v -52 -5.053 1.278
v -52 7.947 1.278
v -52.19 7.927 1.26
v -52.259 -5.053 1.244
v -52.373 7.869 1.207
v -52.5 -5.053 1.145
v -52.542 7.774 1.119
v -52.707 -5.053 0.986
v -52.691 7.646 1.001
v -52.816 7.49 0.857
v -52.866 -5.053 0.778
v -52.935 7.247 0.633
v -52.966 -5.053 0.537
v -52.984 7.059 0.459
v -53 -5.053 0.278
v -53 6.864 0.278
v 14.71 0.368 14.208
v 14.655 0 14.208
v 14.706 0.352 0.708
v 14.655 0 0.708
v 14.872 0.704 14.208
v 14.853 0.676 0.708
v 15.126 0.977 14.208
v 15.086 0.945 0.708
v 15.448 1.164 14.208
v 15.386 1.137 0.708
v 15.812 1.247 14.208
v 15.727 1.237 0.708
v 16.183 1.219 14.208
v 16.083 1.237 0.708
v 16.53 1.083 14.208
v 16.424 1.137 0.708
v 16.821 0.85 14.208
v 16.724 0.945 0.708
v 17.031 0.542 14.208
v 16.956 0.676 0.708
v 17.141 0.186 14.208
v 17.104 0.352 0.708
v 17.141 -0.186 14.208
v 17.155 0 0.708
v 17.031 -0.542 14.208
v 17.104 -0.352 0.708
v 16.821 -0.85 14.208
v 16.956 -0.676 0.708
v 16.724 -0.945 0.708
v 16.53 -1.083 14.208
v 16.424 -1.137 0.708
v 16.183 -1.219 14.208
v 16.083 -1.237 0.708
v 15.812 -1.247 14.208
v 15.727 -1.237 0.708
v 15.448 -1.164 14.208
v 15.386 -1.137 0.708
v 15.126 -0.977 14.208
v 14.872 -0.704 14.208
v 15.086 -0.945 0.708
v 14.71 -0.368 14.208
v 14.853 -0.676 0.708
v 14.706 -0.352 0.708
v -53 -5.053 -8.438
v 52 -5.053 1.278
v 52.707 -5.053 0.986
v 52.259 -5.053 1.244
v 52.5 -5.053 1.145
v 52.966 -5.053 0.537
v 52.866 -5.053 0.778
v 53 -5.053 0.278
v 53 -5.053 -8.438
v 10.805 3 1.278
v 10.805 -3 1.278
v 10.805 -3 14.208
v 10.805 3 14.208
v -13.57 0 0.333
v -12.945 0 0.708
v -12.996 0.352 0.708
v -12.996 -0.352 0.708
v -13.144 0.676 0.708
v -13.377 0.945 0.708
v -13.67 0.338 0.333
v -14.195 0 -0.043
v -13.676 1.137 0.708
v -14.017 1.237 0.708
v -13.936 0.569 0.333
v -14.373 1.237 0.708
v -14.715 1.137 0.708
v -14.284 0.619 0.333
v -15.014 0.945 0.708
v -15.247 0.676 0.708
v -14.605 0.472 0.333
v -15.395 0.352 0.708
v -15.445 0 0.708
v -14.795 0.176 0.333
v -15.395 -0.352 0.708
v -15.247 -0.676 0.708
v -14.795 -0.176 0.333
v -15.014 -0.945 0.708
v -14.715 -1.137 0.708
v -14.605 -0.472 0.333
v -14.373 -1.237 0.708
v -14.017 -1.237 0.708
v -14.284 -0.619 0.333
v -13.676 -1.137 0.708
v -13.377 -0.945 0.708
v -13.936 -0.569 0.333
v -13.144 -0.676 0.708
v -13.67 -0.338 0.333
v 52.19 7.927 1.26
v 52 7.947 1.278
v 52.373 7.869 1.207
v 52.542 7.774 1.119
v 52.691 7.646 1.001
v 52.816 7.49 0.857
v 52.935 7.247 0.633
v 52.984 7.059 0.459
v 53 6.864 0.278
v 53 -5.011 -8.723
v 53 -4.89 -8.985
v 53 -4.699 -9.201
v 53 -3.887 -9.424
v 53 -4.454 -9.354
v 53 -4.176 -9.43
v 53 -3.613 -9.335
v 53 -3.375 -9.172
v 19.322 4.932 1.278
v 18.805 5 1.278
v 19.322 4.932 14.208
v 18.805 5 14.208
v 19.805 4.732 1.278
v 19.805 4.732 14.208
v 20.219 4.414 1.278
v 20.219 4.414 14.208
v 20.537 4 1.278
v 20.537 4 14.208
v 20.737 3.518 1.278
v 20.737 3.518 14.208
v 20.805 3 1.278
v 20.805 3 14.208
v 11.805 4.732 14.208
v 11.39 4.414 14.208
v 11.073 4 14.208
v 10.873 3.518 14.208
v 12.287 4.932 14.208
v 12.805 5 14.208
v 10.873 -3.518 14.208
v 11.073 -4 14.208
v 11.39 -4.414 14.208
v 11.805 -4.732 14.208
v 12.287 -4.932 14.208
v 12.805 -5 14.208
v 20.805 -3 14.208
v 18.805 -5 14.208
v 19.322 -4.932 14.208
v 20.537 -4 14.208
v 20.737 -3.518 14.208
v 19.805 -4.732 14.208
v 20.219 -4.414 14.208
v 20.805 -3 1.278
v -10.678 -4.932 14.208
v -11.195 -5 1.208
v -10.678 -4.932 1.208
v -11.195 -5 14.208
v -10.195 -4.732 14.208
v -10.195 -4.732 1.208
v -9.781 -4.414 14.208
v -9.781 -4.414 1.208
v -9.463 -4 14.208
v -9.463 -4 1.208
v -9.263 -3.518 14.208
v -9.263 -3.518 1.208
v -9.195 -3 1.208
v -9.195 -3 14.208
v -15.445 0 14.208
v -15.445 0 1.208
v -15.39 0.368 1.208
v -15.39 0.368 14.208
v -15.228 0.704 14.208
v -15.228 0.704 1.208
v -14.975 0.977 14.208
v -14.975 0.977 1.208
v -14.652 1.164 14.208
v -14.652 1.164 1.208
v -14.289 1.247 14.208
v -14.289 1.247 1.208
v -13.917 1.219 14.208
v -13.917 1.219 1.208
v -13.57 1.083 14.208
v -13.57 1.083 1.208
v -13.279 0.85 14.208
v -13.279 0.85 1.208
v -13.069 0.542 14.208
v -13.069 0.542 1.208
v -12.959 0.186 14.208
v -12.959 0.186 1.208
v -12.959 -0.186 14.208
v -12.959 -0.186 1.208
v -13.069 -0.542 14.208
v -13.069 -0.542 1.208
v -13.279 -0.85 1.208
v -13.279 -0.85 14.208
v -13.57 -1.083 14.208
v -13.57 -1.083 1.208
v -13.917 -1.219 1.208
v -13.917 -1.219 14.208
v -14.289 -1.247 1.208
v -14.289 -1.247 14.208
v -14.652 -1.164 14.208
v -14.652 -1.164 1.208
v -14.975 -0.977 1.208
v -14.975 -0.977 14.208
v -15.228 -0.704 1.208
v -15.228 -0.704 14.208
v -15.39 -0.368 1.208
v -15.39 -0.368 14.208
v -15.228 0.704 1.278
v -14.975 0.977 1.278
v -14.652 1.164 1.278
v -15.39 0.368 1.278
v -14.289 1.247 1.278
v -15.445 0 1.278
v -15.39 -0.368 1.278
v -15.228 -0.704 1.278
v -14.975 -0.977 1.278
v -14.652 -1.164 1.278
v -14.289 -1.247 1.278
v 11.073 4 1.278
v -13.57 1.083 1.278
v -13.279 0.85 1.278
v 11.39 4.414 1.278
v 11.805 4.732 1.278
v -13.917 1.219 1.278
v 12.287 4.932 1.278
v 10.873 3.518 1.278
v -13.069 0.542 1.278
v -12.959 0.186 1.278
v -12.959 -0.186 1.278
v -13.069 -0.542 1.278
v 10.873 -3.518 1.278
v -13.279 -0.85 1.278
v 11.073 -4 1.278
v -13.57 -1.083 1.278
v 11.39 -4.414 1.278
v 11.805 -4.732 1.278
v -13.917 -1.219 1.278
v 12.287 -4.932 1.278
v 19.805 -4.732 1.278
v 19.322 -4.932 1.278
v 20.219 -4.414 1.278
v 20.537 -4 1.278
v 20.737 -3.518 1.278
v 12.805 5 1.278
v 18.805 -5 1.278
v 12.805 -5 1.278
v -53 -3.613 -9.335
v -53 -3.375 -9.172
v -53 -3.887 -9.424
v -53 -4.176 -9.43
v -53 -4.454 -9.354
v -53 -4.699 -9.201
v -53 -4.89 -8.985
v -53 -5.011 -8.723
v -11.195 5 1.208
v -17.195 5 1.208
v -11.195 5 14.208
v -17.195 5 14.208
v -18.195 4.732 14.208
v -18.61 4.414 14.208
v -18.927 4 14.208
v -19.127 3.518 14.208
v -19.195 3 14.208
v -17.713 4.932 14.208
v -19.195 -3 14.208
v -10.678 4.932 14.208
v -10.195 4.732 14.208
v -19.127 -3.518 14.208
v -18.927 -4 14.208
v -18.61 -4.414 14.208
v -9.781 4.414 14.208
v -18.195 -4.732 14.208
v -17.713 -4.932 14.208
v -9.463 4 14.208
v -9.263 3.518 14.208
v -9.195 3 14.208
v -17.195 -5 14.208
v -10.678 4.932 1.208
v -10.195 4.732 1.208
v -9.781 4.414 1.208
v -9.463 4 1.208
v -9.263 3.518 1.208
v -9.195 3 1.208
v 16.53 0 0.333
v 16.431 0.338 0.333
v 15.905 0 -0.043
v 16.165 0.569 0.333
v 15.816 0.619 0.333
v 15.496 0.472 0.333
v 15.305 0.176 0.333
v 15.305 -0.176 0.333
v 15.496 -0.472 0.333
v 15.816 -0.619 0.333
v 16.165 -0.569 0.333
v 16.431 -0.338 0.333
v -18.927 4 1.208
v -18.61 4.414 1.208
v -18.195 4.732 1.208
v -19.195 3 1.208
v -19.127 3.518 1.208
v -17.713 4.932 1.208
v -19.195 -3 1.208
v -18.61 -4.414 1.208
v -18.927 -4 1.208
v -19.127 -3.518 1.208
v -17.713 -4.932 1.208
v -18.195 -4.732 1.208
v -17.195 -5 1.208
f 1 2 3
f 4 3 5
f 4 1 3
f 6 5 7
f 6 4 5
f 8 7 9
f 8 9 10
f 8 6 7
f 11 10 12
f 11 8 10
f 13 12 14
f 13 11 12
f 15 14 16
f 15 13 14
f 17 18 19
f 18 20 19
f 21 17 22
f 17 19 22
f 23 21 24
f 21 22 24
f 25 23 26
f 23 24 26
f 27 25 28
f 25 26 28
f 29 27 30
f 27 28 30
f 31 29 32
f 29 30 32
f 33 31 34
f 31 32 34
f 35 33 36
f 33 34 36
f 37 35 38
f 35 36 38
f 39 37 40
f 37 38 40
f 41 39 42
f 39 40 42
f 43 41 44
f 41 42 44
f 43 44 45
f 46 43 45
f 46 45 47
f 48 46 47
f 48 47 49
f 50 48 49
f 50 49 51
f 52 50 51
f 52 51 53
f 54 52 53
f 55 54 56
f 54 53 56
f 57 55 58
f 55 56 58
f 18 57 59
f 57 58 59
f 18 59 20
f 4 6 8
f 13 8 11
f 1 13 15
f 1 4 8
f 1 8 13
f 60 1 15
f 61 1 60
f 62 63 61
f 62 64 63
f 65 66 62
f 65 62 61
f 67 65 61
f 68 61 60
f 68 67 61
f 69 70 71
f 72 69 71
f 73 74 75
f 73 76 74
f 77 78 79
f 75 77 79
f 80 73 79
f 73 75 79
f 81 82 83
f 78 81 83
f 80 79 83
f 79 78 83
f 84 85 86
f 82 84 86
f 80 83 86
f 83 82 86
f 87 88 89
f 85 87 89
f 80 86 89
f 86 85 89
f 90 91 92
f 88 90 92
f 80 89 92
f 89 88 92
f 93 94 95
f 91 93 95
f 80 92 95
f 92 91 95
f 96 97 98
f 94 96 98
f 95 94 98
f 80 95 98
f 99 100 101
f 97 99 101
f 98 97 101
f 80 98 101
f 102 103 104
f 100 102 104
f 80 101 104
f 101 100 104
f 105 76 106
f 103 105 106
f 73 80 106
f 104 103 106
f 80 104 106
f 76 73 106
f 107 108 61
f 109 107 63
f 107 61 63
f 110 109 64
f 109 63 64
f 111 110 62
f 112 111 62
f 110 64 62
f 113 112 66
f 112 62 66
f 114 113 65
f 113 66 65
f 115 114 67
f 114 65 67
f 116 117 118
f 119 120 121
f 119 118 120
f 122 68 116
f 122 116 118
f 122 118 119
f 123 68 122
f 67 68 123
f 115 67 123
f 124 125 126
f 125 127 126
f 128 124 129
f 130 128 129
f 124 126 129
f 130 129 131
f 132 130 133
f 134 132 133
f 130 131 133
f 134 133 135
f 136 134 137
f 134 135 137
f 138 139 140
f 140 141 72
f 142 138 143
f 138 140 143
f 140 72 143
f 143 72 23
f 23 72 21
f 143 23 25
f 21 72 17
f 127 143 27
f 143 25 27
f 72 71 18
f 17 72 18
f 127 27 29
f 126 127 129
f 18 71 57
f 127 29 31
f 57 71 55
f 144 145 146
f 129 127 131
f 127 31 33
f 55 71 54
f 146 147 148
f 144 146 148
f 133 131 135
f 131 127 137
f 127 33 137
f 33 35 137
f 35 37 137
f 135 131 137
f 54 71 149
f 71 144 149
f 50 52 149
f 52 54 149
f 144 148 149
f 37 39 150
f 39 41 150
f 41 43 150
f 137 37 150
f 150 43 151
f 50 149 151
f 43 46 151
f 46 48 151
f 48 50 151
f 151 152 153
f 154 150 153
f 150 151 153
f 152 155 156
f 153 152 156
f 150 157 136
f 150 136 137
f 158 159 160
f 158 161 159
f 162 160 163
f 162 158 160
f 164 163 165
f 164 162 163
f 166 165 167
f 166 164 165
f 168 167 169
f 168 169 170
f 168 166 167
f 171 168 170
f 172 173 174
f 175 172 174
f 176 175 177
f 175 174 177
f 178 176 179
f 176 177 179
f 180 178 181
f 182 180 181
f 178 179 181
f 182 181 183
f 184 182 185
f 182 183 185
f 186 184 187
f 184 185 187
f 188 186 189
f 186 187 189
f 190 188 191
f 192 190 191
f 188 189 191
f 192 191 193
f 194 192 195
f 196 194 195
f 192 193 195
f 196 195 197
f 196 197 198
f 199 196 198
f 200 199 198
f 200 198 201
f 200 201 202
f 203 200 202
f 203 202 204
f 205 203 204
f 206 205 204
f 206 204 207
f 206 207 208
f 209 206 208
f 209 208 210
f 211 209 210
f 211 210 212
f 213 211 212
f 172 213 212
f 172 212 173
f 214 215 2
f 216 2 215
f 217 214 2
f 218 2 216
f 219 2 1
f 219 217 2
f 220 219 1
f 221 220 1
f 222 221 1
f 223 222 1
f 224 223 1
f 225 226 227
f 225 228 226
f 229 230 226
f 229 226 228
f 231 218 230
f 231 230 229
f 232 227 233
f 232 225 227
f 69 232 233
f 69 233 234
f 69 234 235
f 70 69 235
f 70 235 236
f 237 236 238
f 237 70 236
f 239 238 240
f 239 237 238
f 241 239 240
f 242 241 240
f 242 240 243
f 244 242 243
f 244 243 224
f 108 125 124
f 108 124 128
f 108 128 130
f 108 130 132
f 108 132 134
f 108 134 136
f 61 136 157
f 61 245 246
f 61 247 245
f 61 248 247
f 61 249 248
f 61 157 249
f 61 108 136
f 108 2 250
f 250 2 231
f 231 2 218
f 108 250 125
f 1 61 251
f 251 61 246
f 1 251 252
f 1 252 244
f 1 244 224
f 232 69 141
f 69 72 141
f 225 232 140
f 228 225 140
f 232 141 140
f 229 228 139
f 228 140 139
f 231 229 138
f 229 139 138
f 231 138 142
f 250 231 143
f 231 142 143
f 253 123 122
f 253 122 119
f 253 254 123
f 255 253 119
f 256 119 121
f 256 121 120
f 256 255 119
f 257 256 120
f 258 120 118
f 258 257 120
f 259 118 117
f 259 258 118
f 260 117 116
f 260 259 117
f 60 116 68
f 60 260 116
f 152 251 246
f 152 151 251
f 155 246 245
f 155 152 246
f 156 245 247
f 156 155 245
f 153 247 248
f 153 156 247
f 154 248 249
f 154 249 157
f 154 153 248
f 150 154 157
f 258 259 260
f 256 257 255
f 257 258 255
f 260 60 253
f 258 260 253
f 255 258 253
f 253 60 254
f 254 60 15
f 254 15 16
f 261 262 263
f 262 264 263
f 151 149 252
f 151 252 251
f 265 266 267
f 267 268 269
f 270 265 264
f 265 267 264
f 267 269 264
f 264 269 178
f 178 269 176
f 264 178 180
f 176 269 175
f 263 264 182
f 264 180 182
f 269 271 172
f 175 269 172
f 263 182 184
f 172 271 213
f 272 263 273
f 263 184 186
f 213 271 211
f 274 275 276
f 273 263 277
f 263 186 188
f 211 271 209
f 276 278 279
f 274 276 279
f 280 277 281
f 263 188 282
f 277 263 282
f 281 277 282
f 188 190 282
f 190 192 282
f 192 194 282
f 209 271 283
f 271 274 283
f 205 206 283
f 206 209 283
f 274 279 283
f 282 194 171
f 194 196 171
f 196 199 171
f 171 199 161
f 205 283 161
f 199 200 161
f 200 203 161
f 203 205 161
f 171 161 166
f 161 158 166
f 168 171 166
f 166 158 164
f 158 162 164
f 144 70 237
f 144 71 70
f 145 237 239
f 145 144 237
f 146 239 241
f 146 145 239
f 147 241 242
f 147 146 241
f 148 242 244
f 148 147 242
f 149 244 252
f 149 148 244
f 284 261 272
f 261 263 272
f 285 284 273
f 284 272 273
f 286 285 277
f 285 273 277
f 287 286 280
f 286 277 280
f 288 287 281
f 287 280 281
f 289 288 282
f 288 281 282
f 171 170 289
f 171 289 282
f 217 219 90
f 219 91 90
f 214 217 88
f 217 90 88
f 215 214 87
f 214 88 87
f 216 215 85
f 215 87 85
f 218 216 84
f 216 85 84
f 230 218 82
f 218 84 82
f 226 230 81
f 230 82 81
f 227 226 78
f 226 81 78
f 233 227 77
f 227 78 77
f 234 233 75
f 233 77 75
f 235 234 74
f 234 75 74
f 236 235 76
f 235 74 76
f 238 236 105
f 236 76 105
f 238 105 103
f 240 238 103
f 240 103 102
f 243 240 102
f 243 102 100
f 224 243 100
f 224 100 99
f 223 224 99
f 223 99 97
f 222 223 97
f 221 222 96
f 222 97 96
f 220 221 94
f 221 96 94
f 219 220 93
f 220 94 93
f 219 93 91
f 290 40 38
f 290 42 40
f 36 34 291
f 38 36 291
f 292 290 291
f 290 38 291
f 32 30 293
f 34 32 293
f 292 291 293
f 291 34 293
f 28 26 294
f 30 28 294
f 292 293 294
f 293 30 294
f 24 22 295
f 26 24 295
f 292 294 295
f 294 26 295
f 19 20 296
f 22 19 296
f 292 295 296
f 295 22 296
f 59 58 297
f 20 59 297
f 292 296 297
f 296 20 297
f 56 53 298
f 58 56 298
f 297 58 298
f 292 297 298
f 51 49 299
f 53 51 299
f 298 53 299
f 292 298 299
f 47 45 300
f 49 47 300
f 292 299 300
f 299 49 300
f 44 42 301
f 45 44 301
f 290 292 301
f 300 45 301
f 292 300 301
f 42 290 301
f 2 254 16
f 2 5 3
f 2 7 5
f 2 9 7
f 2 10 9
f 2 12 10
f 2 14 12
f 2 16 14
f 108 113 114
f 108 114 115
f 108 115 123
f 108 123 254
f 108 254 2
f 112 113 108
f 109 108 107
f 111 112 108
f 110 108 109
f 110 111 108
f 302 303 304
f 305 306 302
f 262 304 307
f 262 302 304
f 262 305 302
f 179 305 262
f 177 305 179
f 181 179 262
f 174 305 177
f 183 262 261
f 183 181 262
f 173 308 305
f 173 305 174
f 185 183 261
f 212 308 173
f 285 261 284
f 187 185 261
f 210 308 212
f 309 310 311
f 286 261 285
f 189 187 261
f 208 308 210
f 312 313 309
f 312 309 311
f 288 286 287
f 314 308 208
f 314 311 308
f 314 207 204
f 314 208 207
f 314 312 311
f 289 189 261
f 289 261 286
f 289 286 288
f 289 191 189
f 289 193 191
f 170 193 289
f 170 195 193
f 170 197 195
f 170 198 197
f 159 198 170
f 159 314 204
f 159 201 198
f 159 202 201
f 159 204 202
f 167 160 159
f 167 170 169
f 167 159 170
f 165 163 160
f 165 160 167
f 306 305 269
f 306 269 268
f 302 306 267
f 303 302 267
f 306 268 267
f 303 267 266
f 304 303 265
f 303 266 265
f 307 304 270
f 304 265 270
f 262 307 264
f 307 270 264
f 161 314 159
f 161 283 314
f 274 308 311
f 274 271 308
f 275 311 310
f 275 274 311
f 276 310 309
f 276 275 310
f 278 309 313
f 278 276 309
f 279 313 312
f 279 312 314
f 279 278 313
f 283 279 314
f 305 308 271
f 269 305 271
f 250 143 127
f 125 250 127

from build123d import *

# Parameters (mm, degrees)
F1_DEPTH       = 53
F2_W           = 10
F2_H           = 13
F3_DEPTH       = 5
F4_DEPTH       = 5
F7_D           = 2.5
F7_DEPTH       = 13.5
F7_TIP         = 0.7510757738
F7_2_D         = 2.5
F7_2_DEPTH     = 13.5
F7_2_TIP       = 0.7510757738
F7_ON_F5_D     = 2.5
F7_ON_F5_DEPTH = 13.5
F7_ON_F5_TIP   = 0.7510757738
F8_R           = 2
F8_2_R         = 2
F9_R           = 1


with BuildPart() as f1:
    # F0 (on Right) → F1 (new body, symmetric)
    with BuildSketch(Plane.YZ):
        Polygon((7.9469728339, 1.278479274), (-5.0530271661, 1.278479274), (-5.0530271661, -10.721520726), align=None)
    extrude(amount=F1_DEPTH, both=True)

    # F2 (on Front) → F4 (join, symmetric)
    with BuildSketch(Plane.XZ):
        with Locations((15.8046587557, 7.7083671931)):
            Rectangle(F2_W, F2_H)
    extrude(amount=F4_DEPTH, both=True)

    # F7
    with Locations(Plane.XY.offset(14.2083671931)):
        with Locations((-14.1953412443, 0)):
            Hole(F7_D / 2, depth=F7_DEPTH)
            with Locations((0, 0, -(F7_DEPTH + F7_TIP / 2))):  # 118° drill point
                Cone(0, F7_D / 2, F7_TIP, mode=Mode.SUBTRACT)

    # F7 on F5
    with Locations(Plane.XY.offset(14.2083671931)):
        with Locations((15.9049257636, 0)):
            Hole(F7_ON_F5_D / 2, depth=F7_ON_F5_DEPTH)
            with Locations((0, 0, -(F7_ON_F5_DEPTH + F7_ON_F5_TIP / 2))):  # 118° drill point
                Cone(0, F7_ON_F5_D / 2, F7_ON_F5_TIP, mode=Mode.SUBTRACT)

    # F8#2
    f8_2_edges = [f1.edges().sort_by_distance(p)[0] for p in [
        (10.804659, -5, 7.743423),
        (20.804659, -5, 7.743423),
        (20.804659, 5, 7.743423),
        (10.804659, 5, 7.743423),
    ]]
    fillet(f8_2_edges, radius=F8_2_R)

    # F9
    f9_edges = [f1.edges().sort_by_distance(p)[0] for p in [
        (53, 1.446973, 1.278479),
        (-53, 1.446973, 1.278479),
        (0, -5.053027, -10.721521),
    ]]
    fillet(f9_edges, radius=F9_R)


with BuildPart() as f3:
    # F2 (on Front) → F3 (new body, symmetric)
    with BuildSketch(Plane.XZ):
        with Locations((-14.1953412443, 7.7083671931)):
            Rectangle(F2_W, F2_H)
    extrude(amount=F3_DEPTH, both=True)

    # F7#2
    with Locations(Plane.XY.offset(14.2083671931)):
        with Locations((-14.1953412443, 0)):
            Hole(F7_2_D / 2, depth=F7_2_DEPTH)
            with Locations((0, 0, -(F7_2_DEPTH + F7_2_TIP / 2))):  # 118° drill point
                Cone(0, F7_2_D / 2, F7_2_TIP, mode=Mode.SUBTRACT)

    # F8
    f8_edges = [f3.edges().sort_by_distance(p)[0] for p in [
        (-9.195341, -5, 7.708367),
        (-9.195341, 5, 7.708367),
        (-19.195341, 5, 7.708367),
        (-19.195341, -5, 7.708367),
    ]]
    fillet(f8_edges, radius=F8_R)


solid = Compound([f1.part, f3.part])
